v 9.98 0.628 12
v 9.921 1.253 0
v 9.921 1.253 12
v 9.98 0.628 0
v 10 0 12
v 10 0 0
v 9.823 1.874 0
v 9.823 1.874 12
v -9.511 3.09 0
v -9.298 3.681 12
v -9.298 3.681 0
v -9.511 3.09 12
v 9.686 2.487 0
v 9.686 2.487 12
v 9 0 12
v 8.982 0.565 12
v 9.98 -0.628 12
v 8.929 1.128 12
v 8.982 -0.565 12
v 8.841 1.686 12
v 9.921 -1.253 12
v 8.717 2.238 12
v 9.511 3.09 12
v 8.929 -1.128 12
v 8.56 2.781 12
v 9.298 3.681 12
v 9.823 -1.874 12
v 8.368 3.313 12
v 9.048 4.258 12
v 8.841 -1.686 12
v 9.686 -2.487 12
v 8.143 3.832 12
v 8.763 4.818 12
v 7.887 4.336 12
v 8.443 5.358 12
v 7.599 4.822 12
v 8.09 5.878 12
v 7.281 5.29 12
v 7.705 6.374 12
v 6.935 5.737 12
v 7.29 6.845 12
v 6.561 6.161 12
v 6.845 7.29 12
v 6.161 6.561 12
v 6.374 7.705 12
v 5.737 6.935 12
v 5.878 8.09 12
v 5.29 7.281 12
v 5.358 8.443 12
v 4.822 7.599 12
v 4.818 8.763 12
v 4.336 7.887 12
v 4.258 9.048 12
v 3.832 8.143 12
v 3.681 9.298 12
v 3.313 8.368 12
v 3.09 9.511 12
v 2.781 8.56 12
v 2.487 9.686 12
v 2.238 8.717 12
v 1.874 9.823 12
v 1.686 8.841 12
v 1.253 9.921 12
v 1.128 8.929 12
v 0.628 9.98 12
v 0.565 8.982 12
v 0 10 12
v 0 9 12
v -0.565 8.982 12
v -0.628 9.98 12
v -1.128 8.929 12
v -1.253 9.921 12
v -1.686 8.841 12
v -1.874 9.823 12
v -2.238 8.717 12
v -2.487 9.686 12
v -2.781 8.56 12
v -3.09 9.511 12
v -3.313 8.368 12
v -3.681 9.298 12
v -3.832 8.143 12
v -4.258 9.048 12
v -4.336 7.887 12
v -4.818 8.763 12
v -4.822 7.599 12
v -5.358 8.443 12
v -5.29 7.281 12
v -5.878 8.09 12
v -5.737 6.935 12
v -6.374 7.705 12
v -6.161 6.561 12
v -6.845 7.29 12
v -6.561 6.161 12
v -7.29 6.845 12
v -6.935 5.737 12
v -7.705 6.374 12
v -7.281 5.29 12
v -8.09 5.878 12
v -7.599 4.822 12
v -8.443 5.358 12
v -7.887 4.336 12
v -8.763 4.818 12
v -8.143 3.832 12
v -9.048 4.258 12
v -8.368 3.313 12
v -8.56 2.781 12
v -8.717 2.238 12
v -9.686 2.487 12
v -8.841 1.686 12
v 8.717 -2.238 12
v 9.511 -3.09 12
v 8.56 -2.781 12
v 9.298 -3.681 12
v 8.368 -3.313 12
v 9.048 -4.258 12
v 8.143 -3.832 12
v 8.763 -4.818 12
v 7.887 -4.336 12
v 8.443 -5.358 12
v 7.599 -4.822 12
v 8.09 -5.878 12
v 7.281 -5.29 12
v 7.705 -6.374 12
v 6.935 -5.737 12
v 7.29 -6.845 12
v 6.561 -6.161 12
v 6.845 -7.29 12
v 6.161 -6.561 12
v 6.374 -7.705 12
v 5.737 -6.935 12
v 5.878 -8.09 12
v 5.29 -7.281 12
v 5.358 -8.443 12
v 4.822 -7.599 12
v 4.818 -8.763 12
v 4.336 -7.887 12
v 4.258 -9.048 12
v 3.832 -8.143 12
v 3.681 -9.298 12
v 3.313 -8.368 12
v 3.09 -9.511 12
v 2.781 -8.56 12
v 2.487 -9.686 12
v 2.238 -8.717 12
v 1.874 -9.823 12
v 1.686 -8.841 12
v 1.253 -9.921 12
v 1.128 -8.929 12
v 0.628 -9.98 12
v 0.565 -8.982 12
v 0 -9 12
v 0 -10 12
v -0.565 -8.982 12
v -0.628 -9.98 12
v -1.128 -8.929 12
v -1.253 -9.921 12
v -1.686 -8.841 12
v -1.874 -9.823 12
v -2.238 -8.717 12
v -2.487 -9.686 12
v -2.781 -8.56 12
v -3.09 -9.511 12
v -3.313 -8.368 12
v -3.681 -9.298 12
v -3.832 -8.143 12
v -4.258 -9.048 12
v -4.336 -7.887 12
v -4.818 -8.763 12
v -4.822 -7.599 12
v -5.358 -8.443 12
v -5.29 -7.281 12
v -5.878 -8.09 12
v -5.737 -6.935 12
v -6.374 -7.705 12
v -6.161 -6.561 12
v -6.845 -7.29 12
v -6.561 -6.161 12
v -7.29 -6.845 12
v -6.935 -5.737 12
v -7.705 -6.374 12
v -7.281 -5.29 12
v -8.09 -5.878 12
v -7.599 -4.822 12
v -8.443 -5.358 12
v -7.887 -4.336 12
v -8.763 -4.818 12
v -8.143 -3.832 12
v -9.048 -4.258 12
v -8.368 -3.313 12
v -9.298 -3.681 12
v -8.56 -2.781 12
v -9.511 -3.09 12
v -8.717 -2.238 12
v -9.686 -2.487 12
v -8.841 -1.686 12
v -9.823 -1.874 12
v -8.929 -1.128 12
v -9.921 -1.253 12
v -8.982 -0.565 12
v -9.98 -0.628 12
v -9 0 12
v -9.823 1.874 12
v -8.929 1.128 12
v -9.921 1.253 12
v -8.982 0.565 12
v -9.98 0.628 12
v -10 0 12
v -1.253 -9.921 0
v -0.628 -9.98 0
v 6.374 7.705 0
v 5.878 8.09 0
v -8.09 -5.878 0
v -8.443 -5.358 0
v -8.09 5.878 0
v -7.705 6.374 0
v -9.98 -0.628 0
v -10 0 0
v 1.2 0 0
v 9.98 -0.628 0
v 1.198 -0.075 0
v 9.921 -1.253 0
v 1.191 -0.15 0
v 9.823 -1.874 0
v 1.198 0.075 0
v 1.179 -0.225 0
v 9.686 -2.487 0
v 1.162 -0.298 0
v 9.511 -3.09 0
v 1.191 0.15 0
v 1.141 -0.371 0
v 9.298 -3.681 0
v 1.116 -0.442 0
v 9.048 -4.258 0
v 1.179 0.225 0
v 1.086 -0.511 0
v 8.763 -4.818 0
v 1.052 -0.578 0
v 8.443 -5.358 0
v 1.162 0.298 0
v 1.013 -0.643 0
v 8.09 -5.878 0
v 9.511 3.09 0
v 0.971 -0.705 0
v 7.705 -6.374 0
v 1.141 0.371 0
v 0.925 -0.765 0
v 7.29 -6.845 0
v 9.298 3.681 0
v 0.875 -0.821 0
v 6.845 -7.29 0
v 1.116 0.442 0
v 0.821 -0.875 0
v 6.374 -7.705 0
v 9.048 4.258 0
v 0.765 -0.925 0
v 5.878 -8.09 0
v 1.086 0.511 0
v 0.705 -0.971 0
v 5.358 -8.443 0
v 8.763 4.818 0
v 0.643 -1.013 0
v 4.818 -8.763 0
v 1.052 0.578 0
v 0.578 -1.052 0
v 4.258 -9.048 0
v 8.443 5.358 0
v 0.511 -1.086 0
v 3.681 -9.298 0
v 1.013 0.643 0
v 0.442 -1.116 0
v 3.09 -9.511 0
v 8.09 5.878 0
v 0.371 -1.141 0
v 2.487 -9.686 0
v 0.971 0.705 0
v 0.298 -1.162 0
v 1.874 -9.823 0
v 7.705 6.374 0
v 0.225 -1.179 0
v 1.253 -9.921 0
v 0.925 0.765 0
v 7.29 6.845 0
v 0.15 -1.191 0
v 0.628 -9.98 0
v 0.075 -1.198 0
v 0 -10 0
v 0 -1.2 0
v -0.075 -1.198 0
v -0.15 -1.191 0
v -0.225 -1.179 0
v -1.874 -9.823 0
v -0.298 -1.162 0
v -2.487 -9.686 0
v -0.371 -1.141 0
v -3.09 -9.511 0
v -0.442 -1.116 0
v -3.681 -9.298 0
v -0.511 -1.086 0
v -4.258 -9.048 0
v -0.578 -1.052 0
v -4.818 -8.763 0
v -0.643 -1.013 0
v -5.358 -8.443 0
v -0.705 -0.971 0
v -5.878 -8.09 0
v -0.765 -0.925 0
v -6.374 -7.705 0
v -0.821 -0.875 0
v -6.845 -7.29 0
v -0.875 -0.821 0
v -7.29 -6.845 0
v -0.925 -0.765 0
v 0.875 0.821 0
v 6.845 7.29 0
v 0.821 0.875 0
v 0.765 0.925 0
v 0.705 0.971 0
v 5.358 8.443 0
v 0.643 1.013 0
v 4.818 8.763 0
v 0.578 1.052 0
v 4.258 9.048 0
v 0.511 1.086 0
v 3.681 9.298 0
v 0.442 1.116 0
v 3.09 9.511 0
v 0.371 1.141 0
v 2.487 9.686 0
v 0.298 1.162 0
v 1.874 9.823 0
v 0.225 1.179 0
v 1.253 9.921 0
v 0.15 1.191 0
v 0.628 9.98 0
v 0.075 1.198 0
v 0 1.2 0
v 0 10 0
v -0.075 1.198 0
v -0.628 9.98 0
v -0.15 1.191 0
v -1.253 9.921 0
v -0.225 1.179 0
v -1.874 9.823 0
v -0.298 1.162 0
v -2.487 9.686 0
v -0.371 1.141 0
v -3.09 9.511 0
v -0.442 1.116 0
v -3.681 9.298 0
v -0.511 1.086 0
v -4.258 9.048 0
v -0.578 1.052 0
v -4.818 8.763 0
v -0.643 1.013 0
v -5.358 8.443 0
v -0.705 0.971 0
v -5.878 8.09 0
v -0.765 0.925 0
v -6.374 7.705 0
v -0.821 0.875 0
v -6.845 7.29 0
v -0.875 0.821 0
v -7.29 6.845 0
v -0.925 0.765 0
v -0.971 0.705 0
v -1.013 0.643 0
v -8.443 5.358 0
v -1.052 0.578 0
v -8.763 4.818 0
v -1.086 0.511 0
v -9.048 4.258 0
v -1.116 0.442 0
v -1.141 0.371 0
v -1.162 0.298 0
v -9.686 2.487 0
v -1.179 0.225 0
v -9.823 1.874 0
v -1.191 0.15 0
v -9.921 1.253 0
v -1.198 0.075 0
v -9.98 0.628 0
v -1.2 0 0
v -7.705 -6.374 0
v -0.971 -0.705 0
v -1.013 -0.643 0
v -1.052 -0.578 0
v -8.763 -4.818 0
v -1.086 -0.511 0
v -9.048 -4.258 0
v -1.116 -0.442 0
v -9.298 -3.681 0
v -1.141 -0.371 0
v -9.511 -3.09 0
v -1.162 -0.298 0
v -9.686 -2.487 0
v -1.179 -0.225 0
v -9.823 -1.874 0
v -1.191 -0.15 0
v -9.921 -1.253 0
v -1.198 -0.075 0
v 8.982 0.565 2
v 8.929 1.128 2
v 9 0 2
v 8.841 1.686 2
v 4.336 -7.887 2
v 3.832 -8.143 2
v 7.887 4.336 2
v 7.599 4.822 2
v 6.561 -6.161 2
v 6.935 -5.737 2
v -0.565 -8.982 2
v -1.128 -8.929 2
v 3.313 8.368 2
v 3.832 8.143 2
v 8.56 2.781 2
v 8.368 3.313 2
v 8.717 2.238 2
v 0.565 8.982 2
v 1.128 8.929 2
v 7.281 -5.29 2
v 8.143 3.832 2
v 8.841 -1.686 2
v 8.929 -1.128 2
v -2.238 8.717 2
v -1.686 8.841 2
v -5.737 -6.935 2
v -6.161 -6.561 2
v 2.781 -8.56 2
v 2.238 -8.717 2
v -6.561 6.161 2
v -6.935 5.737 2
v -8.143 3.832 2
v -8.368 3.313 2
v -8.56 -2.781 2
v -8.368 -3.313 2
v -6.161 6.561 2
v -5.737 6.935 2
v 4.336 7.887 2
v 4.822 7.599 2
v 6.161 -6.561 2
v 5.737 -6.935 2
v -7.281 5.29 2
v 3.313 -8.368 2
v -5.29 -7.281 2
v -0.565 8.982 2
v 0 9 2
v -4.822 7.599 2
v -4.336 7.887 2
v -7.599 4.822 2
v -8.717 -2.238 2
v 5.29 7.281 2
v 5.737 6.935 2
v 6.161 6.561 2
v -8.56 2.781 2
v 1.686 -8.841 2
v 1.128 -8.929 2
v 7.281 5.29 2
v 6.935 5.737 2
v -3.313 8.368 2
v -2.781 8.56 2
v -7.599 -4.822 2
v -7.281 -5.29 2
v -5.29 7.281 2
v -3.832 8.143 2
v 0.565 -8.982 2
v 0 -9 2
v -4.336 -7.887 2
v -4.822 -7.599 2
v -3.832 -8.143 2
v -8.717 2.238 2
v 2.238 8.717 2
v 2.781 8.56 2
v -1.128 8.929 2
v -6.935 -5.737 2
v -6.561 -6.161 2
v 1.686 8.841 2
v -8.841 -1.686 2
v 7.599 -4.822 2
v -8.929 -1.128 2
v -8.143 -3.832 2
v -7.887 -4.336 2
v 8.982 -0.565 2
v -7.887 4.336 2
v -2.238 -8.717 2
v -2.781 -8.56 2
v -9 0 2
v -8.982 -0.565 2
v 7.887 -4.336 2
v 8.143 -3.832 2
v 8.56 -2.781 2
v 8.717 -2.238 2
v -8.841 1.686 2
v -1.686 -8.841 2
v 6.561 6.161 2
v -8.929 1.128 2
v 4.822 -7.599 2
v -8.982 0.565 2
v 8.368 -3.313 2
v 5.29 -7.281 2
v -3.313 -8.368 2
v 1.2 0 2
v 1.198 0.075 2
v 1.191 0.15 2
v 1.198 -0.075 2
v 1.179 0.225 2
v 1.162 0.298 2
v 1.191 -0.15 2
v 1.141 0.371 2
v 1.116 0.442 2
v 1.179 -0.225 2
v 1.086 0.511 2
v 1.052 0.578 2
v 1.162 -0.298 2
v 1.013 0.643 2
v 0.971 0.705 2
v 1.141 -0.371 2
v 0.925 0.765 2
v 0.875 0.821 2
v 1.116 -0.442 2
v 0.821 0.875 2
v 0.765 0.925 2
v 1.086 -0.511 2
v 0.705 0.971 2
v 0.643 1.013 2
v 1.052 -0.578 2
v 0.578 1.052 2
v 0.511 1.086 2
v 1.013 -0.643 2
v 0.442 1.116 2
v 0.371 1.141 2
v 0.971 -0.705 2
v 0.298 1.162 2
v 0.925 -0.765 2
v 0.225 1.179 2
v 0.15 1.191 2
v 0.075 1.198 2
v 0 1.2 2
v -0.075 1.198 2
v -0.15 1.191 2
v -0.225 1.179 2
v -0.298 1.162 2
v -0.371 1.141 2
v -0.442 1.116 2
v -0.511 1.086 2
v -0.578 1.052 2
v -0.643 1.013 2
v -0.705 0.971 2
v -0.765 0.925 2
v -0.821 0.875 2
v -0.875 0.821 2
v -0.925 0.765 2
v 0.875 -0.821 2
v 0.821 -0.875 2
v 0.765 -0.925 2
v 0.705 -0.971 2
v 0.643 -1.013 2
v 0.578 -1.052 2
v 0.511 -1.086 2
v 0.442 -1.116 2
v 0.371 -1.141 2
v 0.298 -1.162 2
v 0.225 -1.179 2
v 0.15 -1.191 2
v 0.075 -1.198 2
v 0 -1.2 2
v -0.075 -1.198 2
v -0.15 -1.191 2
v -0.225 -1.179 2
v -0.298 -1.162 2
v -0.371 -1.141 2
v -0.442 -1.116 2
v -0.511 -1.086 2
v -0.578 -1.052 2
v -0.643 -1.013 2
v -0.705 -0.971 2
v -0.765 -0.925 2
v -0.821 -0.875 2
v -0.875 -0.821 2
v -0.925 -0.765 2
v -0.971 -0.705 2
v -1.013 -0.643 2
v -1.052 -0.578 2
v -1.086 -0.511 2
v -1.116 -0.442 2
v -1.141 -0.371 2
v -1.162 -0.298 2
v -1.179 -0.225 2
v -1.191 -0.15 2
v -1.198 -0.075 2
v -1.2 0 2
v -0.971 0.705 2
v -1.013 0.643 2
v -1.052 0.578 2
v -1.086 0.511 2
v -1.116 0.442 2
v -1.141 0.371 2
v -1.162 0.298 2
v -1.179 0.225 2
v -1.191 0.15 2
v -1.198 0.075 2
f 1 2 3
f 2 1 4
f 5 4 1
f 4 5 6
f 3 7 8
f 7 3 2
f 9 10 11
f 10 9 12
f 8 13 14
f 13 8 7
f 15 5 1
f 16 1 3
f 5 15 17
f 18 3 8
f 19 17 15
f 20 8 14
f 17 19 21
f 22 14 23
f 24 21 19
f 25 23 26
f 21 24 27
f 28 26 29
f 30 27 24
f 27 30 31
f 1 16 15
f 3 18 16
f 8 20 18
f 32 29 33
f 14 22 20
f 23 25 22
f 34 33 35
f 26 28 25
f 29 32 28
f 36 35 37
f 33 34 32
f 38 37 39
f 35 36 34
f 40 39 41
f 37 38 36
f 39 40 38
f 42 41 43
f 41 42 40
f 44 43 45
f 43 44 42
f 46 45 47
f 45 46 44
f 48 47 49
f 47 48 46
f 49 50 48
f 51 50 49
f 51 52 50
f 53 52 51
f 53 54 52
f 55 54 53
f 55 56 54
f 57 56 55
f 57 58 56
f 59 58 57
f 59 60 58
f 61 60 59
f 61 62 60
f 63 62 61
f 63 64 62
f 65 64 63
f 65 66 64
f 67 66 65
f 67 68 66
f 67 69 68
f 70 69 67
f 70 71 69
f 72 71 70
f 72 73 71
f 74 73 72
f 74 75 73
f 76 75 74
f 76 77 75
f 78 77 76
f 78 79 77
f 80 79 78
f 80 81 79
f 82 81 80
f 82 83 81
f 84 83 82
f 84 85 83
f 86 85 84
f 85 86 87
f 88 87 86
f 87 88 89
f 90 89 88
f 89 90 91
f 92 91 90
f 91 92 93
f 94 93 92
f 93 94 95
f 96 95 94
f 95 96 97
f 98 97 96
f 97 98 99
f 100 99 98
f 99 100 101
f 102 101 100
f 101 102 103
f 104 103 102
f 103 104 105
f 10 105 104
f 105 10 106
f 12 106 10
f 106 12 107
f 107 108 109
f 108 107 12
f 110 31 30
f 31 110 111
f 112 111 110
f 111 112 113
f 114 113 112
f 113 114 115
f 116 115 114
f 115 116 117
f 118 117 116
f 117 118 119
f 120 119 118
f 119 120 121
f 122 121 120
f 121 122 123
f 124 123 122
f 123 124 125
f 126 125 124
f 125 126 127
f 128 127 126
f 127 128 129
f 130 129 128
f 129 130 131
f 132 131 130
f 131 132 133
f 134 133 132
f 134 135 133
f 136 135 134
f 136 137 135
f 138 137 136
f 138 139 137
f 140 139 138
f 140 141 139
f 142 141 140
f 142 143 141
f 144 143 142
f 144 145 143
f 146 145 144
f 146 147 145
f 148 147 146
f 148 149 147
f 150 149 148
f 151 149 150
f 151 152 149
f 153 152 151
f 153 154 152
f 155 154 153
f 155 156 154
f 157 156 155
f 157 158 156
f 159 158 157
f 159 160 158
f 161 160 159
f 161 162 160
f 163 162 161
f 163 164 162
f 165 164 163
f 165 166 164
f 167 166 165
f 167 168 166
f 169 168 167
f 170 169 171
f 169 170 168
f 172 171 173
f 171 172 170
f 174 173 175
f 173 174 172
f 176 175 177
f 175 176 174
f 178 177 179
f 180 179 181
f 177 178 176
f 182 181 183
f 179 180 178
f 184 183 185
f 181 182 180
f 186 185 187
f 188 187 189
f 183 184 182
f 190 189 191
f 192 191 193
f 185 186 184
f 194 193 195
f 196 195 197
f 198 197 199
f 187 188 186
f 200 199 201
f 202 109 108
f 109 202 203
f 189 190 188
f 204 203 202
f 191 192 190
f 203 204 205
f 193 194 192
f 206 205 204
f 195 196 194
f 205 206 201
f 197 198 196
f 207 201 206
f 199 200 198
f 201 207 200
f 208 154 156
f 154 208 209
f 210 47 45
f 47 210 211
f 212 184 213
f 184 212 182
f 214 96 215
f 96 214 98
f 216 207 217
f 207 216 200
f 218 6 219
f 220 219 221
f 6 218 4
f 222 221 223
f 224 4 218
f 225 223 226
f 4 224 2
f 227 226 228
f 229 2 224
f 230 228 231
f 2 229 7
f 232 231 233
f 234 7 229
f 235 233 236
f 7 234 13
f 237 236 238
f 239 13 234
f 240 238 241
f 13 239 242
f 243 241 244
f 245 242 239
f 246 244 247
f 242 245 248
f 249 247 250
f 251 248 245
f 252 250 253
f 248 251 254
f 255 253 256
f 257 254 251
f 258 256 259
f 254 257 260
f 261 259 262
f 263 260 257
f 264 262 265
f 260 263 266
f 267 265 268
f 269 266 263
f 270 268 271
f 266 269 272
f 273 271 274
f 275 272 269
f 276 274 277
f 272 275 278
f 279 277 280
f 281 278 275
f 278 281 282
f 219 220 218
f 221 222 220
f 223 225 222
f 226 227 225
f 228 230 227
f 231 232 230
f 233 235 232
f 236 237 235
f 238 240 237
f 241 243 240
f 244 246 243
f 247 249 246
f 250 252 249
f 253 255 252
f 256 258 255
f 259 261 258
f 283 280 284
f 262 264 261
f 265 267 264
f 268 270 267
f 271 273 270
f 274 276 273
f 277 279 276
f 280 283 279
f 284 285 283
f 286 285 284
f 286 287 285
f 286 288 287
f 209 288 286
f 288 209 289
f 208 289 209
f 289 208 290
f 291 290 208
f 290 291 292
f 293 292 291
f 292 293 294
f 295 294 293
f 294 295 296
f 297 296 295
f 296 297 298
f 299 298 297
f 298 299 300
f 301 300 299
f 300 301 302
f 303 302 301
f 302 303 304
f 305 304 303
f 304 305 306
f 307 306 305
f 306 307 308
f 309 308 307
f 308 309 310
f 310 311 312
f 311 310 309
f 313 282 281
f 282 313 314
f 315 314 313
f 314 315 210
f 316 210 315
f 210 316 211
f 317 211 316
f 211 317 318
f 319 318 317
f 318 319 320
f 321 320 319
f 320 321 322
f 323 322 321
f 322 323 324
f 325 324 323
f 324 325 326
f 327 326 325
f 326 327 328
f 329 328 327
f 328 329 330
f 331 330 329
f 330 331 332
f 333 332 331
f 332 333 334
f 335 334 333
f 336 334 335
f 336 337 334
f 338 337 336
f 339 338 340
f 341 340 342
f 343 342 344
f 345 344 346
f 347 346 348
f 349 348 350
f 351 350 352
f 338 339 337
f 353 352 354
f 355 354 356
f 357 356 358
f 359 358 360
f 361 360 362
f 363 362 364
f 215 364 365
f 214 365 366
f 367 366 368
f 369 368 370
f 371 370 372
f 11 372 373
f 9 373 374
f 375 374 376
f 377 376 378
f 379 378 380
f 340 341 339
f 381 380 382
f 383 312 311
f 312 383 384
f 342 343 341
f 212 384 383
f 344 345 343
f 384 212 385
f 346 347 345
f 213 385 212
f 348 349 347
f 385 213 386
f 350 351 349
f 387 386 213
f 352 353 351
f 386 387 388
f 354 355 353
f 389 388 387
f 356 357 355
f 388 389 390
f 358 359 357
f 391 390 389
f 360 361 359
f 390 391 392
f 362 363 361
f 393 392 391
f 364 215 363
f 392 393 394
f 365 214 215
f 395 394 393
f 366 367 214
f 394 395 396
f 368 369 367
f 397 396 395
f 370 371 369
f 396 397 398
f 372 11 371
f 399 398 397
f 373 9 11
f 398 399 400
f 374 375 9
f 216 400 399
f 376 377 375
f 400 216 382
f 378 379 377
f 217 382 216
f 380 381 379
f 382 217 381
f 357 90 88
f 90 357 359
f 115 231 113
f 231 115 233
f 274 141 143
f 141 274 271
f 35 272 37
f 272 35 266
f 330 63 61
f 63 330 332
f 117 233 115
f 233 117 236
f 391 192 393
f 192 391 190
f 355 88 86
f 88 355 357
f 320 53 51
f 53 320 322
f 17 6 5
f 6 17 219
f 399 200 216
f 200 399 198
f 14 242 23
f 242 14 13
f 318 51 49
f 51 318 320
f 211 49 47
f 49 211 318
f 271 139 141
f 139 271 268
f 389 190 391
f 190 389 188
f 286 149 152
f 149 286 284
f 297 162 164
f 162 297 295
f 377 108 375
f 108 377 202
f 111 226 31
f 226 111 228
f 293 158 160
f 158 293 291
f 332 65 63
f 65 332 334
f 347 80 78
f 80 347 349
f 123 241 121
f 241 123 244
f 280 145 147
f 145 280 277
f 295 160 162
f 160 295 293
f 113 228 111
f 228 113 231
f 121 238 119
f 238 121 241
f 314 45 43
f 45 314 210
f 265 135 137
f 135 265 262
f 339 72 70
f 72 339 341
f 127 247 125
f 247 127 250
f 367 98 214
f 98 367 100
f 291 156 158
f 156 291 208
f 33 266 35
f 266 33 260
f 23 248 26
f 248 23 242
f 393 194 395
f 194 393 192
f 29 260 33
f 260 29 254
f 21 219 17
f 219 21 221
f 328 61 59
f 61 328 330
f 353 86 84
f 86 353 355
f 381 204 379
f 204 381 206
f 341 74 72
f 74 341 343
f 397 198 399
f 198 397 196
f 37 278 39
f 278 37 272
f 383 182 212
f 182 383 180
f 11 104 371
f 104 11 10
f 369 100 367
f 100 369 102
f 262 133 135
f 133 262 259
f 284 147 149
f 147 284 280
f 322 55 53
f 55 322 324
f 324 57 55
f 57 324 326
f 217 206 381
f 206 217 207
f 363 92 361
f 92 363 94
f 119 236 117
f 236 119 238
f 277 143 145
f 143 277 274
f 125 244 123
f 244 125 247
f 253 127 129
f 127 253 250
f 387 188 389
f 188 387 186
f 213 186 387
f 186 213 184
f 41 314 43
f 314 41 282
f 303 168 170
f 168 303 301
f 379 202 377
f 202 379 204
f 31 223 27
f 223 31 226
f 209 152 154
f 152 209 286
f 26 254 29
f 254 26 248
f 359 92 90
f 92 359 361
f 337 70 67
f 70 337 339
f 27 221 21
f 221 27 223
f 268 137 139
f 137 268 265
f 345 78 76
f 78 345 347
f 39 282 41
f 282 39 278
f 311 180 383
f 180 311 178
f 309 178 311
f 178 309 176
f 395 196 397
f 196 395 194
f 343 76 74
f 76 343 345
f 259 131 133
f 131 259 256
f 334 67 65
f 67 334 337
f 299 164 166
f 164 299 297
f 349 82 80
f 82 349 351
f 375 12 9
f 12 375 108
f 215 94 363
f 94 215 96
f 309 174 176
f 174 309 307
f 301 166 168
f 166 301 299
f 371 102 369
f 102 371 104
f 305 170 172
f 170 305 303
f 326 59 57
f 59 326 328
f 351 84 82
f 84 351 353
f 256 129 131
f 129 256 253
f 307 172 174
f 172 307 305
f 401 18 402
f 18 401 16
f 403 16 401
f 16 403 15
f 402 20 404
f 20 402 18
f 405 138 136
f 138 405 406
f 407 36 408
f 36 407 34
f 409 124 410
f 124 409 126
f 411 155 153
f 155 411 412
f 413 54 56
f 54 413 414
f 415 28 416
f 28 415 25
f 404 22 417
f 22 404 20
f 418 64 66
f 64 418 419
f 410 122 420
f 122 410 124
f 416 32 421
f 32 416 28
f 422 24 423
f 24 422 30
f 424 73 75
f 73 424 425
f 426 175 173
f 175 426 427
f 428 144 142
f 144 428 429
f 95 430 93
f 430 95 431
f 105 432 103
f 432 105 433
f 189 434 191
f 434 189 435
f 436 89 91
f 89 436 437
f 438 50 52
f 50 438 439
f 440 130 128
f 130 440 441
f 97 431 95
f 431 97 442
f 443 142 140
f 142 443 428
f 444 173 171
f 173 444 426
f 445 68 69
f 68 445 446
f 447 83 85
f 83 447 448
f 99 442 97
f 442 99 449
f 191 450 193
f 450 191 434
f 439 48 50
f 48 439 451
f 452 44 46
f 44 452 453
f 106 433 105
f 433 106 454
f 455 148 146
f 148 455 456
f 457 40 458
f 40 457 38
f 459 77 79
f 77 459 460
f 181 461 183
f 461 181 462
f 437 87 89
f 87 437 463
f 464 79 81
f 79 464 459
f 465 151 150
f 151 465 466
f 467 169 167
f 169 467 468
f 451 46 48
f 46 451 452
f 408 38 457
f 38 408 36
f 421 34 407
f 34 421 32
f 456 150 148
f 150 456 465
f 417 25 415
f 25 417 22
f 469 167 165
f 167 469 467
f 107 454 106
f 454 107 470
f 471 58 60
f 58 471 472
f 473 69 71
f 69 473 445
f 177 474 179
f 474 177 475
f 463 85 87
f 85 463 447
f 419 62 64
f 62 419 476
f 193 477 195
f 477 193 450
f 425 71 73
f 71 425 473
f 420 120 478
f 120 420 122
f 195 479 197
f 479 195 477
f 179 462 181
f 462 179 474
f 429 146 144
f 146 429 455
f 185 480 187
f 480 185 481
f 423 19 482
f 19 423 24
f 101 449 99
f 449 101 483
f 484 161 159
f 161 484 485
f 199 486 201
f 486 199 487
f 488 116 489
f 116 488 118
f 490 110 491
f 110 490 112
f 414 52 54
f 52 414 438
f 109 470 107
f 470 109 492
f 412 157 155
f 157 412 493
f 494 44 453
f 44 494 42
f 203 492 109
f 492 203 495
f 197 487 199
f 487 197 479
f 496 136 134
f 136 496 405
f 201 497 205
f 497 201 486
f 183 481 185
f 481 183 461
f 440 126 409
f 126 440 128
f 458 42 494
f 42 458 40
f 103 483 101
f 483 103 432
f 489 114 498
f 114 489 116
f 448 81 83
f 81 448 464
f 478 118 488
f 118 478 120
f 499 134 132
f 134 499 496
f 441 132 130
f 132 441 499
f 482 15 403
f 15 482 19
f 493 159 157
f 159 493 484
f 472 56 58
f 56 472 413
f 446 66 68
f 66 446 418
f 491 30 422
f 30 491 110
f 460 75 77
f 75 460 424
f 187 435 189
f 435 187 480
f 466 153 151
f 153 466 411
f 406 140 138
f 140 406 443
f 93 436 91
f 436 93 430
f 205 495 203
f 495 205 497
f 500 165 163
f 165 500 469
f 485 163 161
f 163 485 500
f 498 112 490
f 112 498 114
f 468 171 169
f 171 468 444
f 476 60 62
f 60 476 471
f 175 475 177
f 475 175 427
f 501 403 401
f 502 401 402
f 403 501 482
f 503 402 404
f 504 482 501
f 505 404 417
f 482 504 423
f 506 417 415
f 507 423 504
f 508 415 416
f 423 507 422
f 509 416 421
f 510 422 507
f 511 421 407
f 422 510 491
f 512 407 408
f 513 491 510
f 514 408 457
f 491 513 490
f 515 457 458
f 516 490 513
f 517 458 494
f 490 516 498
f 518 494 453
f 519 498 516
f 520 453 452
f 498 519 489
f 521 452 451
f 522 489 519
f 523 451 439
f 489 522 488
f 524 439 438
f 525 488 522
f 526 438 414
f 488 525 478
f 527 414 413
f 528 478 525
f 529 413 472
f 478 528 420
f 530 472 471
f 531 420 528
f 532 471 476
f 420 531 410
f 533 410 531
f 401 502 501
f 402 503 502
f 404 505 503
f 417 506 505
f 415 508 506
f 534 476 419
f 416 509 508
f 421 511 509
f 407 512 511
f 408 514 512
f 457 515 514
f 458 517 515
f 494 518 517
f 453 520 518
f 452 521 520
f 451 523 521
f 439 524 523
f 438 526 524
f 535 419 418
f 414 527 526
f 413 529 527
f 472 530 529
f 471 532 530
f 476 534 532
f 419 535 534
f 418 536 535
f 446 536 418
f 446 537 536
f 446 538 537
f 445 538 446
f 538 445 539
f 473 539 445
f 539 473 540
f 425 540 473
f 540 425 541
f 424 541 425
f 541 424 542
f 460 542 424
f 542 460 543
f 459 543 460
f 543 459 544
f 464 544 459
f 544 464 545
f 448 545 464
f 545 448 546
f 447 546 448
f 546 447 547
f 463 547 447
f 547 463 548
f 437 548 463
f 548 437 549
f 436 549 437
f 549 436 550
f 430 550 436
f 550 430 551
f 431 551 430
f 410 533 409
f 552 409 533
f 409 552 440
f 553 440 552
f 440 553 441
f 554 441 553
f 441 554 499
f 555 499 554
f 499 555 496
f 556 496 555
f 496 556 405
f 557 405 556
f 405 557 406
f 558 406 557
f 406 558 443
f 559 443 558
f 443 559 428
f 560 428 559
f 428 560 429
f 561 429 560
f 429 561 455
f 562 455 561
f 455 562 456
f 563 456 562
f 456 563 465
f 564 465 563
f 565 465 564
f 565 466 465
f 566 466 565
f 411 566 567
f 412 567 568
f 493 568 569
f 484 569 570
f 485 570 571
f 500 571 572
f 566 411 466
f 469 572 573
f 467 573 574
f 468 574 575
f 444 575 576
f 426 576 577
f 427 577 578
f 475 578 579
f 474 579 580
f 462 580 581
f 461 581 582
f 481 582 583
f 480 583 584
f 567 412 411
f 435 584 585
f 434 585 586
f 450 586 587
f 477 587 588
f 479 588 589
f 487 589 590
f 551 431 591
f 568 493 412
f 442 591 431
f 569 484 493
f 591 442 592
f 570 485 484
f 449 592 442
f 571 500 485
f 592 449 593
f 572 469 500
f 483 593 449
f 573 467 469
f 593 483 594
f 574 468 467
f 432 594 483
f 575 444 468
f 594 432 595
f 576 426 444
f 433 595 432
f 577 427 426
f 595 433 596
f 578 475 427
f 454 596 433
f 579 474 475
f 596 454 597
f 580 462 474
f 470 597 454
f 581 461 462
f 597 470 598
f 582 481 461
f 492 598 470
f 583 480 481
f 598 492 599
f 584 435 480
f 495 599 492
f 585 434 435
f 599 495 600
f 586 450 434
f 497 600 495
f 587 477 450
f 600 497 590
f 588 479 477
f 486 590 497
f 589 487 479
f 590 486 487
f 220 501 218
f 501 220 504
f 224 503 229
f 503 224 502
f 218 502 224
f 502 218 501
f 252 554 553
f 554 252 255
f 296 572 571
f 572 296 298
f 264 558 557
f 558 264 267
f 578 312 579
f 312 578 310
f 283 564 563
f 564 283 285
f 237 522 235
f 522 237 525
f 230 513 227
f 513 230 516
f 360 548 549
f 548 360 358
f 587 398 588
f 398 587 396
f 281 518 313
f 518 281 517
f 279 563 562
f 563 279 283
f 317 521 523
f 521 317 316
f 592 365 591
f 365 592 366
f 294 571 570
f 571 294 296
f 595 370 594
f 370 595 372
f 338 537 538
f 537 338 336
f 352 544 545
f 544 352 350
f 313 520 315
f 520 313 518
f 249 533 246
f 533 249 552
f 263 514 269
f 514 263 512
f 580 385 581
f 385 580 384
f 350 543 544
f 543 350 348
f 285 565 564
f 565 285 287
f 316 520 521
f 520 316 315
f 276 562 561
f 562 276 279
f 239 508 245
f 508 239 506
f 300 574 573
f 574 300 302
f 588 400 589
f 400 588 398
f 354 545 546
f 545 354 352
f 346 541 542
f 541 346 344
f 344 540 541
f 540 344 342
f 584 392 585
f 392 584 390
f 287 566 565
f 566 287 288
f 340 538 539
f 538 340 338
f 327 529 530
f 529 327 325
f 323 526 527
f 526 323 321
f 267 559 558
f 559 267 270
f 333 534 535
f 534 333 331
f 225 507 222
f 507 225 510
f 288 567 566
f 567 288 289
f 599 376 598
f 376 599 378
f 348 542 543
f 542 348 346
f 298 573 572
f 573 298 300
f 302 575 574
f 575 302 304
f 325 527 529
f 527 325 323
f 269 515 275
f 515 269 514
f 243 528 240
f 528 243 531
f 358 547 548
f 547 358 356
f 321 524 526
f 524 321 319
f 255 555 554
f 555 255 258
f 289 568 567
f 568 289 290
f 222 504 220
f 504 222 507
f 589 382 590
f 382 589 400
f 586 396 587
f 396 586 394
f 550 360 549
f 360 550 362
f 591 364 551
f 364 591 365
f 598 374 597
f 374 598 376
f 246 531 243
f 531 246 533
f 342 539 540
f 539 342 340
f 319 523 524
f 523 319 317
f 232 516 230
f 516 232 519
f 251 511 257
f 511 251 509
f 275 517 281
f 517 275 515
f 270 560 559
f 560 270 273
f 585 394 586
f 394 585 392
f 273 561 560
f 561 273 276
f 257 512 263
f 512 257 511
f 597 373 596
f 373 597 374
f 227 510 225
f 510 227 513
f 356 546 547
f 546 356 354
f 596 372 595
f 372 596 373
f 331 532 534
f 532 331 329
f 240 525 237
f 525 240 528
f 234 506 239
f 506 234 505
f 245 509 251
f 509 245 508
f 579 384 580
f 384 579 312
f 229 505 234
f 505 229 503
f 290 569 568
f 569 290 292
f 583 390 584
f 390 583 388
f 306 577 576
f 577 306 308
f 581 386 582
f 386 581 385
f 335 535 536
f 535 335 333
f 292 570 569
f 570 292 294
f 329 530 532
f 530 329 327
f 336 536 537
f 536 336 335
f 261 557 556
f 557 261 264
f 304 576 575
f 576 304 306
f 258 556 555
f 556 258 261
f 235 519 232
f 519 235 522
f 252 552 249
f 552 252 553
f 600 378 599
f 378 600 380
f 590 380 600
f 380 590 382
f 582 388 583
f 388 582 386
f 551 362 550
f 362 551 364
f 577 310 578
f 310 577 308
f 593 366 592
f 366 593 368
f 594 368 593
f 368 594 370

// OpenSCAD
print_error = 0.2;

//box(print_error=print_error);
lid(print_error=print_error);

module box(core_radius=7, rod_radius=1, print_error=0) {
  difference() {
    union() {
      difference() {
        union() {
          // главный обод - стенка толщиной 3мм
          cylinder(r=core_radius+3, h=10, $fn=100);

          // выступающий обод, чтобы одеть крышку
          translate([0,0,-5]) cylinder(r=core_radius+2, h=20, $fn=100);
        }
        // вычесть внутренний цилиндр под сердечник мотора
        translate([0,0,-3]) cylinder(r=core_radius+print_error, h=19, $fn=100);
        // дырка под вал мотора в нижней стенке
        translate([0,0,-6]) cylinder(r=rod_radius+print_error, h=4, $fn=100);
      }

      translate([-6,8,0]) difference() {
       cube([12, 8, 10]);
       translate([2, 2, 2]) cube([12-4, 8-2+1, 10-4]);
      }


      mirror([0, -1, 0]) translate([-6,8,0]) difference() {
       cube([12, 8, 10]);
       translate([2, 2, 2]) cube([12-4, 8-2+1, 10-4]);
      }
    }

    translate([-6,6,0])
     translate([2, 2, 2]) cube([12-4, 8-2+1, 10-4]);

    mirror([0, -1, 0]) translate([-6,6,0])
      translate([2, 2, 2]) cube([12-4, 8-2+1, 10-4]);

    translate([-2, -11, 2]) cube([4, 22, 6]);
  }
}

/**
 * Крышка с щетками.
 */
module lid(core_radius=7, rod_radius=1, print_error=0) {
  difference() {
    cylinder(r=10, h=12, $fn=100);

    // одевается на выступающий обод
    translate([0, 0, 2]) 
      cylinder(r=core_radius+2/*+print_error*/, h=12, $fn=100);

    // отверстие под вал мотора
    translate([0, 0, -1]) 
      cylinder(r=rod_radius+print_error, h=4, $fn=100);
  }
}
